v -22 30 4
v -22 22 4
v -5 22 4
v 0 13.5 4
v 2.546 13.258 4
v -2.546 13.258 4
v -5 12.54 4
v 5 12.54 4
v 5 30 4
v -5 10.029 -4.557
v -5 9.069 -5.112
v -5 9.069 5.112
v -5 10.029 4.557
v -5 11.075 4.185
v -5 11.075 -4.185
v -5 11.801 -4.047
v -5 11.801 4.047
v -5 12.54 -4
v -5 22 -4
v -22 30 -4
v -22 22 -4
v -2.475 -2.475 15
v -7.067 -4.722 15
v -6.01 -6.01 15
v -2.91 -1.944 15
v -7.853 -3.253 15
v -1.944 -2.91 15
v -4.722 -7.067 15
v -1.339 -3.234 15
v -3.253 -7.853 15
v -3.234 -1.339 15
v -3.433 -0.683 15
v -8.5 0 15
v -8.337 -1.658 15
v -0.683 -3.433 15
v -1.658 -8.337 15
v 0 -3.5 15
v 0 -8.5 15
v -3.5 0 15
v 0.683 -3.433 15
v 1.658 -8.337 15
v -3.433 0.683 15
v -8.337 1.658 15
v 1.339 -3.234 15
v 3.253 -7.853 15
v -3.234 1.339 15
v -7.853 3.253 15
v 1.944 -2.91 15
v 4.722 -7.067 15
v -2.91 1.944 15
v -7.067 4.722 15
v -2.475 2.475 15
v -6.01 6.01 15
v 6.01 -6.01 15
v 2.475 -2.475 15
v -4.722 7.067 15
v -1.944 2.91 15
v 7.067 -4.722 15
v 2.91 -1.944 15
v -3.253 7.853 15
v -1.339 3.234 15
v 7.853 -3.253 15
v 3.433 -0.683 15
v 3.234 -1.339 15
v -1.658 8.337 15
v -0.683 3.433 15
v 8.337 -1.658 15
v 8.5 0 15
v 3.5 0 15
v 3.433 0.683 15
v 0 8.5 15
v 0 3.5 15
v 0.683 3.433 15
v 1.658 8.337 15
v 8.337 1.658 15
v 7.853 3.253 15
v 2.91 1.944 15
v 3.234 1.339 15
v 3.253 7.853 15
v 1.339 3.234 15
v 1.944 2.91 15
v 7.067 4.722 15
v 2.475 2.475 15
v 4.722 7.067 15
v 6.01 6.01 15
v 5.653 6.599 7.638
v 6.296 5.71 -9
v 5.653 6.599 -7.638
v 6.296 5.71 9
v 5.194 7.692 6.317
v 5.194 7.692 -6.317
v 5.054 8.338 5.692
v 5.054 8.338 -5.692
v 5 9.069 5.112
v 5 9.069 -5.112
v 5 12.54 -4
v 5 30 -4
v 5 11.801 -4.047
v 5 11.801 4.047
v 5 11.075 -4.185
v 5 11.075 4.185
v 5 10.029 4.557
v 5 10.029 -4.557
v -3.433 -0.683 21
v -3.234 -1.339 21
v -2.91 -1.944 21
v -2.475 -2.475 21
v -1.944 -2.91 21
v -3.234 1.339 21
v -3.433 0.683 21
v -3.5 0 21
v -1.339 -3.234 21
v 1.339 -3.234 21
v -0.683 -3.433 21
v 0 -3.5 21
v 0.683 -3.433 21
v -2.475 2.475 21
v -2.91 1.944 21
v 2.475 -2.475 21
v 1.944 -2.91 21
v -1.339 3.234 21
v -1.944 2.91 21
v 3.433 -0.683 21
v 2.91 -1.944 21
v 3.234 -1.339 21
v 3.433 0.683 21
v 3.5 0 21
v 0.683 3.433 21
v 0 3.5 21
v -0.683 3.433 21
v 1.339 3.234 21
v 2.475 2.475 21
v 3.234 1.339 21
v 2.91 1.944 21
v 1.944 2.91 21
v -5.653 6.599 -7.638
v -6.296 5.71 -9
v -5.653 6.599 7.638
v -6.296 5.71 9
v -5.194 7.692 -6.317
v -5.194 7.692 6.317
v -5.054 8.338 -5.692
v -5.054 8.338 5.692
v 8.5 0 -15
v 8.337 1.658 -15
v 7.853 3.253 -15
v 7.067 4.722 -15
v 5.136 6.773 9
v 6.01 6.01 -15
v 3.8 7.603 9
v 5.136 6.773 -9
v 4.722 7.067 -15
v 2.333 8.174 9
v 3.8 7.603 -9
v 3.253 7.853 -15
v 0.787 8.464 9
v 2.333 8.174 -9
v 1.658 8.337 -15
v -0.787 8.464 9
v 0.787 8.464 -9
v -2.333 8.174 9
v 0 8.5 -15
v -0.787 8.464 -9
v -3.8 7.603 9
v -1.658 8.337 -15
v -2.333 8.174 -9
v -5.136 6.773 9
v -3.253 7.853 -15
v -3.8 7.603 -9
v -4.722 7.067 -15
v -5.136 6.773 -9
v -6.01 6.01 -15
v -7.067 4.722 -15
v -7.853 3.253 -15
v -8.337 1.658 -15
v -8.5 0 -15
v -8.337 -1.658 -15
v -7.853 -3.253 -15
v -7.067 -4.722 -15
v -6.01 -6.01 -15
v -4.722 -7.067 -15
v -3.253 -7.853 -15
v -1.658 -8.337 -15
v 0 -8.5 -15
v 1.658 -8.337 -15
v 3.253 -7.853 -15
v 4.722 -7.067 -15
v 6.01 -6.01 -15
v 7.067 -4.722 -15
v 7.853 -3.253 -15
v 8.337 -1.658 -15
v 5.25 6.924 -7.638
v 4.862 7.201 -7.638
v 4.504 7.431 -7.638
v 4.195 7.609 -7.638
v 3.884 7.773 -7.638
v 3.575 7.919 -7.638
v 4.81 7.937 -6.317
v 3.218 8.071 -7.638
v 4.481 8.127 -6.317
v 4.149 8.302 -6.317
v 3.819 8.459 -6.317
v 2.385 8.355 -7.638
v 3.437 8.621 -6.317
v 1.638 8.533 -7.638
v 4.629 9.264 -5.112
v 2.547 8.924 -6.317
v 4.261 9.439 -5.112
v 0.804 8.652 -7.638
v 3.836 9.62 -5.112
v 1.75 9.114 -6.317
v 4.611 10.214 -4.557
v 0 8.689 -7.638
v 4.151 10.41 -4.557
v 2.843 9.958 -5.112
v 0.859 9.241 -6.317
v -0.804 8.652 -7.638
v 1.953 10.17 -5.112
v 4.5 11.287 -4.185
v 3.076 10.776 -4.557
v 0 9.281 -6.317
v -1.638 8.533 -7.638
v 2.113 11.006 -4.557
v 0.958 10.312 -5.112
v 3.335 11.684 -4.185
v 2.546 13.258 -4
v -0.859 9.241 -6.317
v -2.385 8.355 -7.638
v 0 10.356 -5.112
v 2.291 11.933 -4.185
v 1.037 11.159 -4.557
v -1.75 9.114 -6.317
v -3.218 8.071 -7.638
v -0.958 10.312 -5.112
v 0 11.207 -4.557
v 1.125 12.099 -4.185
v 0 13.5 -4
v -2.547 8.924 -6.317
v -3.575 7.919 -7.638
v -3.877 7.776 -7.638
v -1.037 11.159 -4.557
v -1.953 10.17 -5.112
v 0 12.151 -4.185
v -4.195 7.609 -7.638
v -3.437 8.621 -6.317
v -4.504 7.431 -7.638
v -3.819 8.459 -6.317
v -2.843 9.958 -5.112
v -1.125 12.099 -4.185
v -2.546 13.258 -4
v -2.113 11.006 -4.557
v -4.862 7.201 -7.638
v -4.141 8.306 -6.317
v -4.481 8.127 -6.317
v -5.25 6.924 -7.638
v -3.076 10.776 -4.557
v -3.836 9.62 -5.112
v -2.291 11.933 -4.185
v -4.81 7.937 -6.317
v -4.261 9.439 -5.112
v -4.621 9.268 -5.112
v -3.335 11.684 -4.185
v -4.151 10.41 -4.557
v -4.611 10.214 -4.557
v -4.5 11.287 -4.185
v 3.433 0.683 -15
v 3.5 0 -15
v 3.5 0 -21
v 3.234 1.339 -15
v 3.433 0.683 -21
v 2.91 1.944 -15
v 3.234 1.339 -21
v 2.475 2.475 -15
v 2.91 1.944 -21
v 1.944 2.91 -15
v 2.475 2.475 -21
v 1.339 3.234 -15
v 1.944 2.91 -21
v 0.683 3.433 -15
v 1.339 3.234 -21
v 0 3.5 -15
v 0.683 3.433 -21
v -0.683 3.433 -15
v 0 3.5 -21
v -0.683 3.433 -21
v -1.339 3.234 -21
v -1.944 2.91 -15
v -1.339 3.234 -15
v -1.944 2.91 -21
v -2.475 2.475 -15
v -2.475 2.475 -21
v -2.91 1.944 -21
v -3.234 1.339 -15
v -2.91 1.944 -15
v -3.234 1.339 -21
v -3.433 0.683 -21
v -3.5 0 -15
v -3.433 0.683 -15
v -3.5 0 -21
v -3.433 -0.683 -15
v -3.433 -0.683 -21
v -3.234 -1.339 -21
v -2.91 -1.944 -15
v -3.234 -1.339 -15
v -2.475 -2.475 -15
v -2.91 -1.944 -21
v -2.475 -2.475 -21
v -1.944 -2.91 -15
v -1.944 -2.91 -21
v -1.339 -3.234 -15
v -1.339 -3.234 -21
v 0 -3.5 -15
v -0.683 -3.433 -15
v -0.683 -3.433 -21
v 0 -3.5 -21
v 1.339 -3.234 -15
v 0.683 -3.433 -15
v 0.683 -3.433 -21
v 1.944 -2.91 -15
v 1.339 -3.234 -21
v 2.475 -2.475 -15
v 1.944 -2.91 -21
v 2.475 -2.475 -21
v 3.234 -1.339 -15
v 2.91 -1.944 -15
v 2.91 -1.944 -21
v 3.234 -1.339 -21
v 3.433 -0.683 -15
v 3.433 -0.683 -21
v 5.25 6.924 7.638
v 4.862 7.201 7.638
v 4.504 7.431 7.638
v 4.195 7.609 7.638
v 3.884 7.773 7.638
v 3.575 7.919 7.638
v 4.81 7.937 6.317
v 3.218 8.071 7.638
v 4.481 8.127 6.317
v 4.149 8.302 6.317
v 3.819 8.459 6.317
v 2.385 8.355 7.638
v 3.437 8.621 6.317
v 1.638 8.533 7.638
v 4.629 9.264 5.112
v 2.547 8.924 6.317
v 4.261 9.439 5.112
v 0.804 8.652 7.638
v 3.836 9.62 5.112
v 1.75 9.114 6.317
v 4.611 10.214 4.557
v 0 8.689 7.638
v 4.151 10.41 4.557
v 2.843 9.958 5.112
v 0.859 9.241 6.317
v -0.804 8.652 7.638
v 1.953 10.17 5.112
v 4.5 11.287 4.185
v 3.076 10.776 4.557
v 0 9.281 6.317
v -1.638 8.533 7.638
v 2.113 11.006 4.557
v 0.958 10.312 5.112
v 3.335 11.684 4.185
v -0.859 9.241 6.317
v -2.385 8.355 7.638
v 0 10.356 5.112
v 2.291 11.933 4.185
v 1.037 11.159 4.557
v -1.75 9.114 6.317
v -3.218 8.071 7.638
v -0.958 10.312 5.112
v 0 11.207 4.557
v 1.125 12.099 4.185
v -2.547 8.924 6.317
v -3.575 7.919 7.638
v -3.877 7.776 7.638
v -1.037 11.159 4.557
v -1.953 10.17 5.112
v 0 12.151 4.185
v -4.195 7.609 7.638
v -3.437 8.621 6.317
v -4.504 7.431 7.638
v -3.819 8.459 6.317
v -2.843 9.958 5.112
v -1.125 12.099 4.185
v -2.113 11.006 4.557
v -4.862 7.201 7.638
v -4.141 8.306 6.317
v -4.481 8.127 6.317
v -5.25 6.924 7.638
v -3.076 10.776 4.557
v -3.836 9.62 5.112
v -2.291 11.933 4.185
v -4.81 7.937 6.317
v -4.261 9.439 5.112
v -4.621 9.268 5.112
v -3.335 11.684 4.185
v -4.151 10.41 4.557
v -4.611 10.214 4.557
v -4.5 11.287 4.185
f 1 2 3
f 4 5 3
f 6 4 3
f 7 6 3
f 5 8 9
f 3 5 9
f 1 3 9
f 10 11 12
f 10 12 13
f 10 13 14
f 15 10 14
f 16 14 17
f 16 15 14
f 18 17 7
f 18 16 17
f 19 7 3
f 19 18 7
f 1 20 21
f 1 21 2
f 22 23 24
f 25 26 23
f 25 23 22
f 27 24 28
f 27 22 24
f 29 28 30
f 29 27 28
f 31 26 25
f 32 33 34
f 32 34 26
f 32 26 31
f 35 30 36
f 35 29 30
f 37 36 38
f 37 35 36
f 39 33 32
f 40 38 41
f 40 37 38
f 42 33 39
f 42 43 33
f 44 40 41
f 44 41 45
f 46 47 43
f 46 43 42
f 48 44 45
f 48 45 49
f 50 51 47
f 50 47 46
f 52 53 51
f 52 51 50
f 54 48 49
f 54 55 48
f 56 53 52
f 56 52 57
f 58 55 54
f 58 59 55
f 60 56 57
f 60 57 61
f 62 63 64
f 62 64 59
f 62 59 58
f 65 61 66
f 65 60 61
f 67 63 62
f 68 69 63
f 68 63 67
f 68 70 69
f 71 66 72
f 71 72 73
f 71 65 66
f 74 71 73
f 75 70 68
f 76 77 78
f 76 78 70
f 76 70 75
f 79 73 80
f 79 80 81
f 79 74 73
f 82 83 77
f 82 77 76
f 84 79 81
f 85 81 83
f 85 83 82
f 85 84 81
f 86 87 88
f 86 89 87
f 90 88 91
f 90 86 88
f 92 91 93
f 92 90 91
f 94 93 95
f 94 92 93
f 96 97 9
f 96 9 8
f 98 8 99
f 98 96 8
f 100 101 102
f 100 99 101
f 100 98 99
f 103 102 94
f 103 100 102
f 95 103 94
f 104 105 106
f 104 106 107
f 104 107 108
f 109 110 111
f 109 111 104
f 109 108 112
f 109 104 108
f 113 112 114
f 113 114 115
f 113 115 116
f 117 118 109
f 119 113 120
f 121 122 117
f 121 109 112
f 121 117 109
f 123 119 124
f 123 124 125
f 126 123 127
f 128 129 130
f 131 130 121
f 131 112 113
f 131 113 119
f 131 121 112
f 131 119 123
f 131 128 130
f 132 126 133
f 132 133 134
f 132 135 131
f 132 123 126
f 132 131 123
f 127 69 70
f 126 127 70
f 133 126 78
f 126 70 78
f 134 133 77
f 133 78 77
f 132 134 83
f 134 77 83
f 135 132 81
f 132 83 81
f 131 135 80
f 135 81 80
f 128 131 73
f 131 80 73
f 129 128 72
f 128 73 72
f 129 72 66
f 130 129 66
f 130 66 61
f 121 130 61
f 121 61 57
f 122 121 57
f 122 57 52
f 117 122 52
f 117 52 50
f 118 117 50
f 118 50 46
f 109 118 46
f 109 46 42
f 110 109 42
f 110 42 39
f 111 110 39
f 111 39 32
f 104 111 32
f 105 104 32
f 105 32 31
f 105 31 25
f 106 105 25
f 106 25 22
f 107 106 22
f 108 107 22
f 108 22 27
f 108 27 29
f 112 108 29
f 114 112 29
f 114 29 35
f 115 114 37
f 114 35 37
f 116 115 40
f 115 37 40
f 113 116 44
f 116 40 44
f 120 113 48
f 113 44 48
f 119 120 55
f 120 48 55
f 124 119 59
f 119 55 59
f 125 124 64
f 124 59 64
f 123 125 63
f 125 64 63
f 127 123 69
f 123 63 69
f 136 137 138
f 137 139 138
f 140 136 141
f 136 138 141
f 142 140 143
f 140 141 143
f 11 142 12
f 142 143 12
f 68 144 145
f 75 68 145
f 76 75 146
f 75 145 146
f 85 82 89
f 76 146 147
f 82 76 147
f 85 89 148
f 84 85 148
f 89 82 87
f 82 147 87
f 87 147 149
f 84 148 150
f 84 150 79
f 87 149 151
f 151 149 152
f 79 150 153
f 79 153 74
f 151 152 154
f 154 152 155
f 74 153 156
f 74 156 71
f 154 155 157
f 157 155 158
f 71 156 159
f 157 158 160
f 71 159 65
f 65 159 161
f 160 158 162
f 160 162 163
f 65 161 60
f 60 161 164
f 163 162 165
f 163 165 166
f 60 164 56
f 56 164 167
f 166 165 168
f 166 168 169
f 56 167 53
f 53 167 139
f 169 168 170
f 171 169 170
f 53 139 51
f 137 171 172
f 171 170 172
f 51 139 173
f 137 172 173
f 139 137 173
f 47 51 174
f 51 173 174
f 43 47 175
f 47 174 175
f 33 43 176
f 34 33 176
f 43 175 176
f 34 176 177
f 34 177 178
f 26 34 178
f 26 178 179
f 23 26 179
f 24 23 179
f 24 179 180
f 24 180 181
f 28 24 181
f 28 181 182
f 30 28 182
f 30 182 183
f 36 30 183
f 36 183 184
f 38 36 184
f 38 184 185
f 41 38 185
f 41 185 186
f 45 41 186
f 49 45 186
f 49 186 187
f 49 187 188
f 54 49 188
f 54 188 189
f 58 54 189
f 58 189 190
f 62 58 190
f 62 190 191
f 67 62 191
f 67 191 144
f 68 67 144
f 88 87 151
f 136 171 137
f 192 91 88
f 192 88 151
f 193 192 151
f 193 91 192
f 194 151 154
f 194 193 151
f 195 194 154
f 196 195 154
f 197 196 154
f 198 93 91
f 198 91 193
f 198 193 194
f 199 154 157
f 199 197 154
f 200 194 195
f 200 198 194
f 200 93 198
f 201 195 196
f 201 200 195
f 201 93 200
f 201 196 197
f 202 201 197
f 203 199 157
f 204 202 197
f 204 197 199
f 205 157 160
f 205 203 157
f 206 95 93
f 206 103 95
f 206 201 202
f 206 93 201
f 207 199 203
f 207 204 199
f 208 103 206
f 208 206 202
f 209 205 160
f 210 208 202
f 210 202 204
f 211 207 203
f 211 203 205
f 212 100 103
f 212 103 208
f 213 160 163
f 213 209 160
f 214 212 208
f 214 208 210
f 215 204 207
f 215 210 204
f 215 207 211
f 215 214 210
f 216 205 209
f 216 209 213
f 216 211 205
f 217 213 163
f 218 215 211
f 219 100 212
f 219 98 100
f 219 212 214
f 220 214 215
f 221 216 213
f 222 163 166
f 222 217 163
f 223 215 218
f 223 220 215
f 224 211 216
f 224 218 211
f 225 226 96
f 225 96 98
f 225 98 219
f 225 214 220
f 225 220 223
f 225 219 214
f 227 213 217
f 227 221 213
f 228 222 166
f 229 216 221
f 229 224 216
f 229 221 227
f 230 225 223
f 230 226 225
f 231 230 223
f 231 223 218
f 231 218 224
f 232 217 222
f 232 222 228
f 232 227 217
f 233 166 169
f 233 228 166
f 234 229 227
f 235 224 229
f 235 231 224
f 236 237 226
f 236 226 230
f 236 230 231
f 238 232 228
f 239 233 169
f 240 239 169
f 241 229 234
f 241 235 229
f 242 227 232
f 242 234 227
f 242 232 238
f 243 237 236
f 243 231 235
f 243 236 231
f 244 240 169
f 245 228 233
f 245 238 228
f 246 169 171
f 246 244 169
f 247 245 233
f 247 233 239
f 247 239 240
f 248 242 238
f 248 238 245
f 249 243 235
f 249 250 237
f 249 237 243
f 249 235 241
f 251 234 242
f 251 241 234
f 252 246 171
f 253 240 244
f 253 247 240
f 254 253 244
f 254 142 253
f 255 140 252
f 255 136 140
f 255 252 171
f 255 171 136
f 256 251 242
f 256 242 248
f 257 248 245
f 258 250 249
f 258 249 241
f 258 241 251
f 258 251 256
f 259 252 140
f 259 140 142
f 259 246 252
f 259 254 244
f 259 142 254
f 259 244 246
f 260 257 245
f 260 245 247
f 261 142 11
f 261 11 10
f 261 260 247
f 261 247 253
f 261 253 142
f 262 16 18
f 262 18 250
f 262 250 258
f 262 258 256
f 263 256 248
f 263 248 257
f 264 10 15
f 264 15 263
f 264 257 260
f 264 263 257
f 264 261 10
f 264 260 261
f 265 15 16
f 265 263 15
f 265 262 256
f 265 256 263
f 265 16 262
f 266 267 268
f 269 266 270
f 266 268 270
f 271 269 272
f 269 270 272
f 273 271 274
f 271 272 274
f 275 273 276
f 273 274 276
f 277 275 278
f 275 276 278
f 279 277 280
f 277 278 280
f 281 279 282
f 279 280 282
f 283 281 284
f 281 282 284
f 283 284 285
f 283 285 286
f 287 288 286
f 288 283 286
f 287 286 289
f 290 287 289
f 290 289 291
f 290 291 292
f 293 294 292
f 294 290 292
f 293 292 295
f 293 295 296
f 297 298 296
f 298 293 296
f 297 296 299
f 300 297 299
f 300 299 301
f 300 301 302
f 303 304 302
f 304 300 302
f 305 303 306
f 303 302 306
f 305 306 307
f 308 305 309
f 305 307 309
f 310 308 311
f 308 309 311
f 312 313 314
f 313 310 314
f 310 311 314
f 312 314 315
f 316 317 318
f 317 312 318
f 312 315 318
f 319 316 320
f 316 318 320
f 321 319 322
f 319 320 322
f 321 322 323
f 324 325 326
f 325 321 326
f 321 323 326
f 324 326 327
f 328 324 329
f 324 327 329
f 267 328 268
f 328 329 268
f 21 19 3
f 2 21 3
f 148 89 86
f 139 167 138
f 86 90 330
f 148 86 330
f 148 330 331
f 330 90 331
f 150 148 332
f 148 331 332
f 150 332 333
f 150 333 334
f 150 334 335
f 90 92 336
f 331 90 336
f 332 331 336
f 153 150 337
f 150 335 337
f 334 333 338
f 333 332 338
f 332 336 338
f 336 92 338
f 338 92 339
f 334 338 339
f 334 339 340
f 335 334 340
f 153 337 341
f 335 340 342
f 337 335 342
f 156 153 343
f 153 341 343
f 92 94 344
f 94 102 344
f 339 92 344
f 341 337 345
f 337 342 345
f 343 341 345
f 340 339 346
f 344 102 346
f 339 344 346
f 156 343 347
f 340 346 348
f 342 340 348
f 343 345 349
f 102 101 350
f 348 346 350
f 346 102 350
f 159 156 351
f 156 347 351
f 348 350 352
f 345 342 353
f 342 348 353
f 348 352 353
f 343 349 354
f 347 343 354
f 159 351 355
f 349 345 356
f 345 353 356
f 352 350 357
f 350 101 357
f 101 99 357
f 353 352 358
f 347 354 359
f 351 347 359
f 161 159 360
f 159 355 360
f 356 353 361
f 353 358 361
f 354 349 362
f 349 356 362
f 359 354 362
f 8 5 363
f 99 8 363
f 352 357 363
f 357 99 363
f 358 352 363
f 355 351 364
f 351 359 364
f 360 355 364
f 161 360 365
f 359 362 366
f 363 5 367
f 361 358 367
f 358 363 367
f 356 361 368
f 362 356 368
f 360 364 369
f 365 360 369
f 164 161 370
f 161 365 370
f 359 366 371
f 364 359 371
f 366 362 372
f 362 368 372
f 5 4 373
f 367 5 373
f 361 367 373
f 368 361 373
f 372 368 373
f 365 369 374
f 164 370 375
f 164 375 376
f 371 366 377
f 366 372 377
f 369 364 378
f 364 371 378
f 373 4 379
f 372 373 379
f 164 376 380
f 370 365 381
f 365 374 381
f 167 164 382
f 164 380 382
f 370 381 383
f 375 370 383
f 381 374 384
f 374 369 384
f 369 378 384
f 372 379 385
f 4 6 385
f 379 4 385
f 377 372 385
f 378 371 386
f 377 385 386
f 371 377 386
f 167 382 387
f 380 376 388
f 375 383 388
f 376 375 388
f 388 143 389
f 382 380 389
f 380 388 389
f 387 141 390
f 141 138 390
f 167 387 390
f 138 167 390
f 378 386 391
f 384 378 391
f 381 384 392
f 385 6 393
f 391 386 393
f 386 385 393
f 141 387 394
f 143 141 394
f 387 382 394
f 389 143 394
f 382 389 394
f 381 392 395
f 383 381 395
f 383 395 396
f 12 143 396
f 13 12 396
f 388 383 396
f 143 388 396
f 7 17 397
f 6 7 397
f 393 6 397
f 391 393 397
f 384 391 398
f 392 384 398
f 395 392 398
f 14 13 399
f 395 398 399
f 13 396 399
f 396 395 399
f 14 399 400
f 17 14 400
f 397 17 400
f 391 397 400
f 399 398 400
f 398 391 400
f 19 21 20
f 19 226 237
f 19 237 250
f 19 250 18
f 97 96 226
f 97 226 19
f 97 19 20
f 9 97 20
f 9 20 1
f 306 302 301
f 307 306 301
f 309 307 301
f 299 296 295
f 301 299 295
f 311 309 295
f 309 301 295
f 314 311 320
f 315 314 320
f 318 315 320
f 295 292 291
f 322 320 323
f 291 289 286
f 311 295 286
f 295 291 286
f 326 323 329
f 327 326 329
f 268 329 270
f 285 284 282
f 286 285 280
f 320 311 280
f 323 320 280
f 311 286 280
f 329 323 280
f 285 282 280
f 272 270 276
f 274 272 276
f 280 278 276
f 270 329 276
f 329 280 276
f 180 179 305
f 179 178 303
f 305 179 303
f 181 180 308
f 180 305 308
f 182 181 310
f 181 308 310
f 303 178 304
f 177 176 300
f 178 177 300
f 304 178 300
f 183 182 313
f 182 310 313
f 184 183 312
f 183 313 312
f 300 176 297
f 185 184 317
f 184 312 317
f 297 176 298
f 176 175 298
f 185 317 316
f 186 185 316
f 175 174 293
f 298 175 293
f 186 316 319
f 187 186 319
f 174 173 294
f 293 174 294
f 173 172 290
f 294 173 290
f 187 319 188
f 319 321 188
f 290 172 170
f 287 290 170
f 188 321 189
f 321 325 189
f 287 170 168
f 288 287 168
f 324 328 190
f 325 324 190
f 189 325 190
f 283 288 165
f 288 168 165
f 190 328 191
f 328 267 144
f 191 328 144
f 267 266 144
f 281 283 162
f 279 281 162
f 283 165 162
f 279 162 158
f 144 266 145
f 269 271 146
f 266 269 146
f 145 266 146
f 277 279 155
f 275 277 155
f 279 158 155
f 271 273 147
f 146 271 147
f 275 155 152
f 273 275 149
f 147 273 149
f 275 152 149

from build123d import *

# Parameters (mm, degrees)
BOSS_EXTRUDE1_DEPTH      = 15
BOSS_EXTRUDE1_DEPTH_BACK = 15
SKETCH1_R                = 8.5
BOSS_EXTRUDE2_DEPTH      = 4
BOSS_EXTRUDE2_DEPTH_BACK = 4
FILLET1_R                = 5
SKETCH3_W                = 8
SKETCH3_H                = 8
BOSS_EXTRUDE3_DEPTH      = 17
BOSS_EXTRUDE4_DEPTH      = 6
BOSS_EXTRUDE4_DEPTH_BACK = 36
SKETCH4_R                = 3.5


with BuildPart() as part:
    # Sketch1 → Boss-Extrude1 (new, two sides: drawn at the far end of the back side and taken through both)
    with BuildSketch(Plane.XY.offset(-BOSS_EXTRUDE1_DEPTH_BACK)):
        Circle(SKETCH1_R)
    extrude(amount=BOSS_EXTRUDE1_DEPTH + BOSS_EXTRUDE1_DEPTH_BACK)

    # Sketch2 → Boss-Extrude2 (add, two sides: drawn at the far end of the back side and taken through both)
    with BuildSketch(Plane.XY.offset(-BOSS_EXTRUDE2_DEPTH_BACK)):
        with BuildLine():
            Line((-5, 6.873863542), (-5, 30))
            Line((-5, 30), (5, 30))
            Line((5, 30), (5, 6.873863542))
            ThreePointArc((5, 6.873863542), (0, 8.5), (-5, 6.873863542))
        make_face()
    extrude(amount=BOSS_EXTRUDE2_DEPTH + BOSS_EXTRUDE2_DEPTH_BACK)

    # Fillet1
    fillet1_edges = [part.edges().sort_by_distance(p)[0] for p in [
        (5, 6.873863542, 0),
        (0, 8.5, -4),
        (-5, 6.873863542, 0),
        (0, 8.5, 4),
    ]]
    fillet(fillet1_edges, radius=FILLET1_R)

    # Sketch3 → Boss-Extrude3 (add)
    with BuildSketch(Plane.ZY.offset(5)):
        with Locations((0, 26)):
            Rectangle(SKETCH3_W, SKETCH3_H)
    extrude(amount=BOSS_EXTRUDE3_DEPTH)

    # Sketch4 → Boss-Extrude4 (add, two sides: drawn at the far end of the back side and taken through both)
    with BuildSketch(Plane.XY.offset(15).offset(-BOSS_EXTRUDE4_DEPTH_BACK)):
        Circle(SKETCH4_R)
    extrude(amount=BOSS_EXTRUDE4_DEPTH + BOSS_EXTRUDE4_DEPTH_BACK)


solid = part.part
